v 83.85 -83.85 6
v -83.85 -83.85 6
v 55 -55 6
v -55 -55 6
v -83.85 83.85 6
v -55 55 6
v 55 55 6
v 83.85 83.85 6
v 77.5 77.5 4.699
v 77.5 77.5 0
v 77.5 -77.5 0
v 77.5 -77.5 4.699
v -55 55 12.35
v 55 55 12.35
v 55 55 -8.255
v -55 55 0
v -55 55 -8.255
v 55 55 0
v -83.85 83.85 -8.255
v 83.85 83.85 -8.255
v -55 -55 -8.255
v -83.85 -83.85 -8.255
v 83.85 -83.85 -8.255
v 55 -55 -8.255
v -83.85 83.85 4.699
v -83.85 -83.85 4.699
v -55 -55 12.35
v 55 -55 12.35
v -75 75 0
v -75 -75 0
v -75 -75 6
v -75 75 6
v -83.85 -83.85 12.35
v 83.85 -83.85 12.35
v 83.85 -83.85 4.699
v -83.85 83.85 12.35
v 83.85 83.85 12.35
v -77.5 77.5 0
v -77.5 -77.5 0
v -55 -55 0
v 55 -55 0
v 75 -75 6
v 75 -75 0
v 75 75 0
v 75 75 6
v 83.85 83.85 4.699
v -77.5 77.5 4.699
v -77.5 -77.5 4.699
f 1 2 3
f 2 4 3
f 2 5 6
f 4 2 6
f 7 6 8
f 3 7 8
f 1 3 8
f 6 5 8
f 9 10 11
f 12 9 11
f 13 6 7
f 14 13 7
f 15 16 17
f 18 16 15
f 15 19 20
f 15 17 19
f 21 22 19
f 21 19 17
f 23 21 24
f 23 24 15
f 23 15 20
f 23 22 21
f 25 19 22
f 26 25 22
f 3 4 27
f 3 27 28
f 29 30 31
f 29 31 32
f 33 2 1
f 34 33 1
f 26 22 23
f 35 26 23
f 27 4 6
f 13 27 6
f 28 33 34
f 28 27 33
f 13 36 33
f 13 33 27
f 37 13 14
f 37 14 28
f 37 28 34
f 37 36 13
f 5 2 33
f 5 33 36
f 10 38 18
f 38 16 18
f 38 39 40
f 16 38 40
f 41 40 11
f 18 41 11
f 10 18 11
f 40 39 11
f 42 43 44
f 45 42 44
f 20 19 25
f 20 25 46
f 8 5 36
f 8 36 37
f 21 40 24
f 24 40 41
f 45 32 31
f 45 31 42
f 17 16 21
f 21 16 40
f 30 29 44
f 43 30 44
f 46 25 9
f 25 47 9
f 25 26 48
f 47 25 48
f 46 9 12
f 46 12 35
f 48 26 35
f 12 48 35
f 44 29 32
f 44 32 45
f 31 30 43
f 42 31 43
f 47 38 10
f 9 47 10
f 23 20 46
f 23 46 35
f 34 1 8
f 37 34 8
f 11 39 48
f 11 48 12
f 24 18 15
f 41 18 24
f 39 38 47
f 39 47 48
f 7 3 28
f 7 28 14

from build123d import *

# Parameters (mm, degrees)
F0_W     = 150
F0_H     = 150
F1_DEPTH = 6
F2_W     = 155
F2_H     = 155
F2_W_2   = 110
F2_H_2   = 110
F3_DEPTH = 8.255
F4_W     = 167.7
F4_H     = 167.7
F4_W_2   = 155
F4_H_2   = 155
F5_DEPTH = 12.954
F6_W     = 167.7
F6_H     = 167.7
F6_W_2   = 110
F6_H_2   = 110
F7_DEPTH = 6.35


with BuildPart() as f1:
    # F0 (on Top) → F1 (new body)
    with BuildSketch(Plane.XY):
        Rectangle(F0_W, F0_H)
    extrude(amount=F1_DEPTH)


with BuildPart() as f3:
    # F2 (on face) → F3 (new body)
    with BuildSketch(Plane(origin=(0, 0, 0), x_dir=(1, 0, 0), z_dir=(0, 0, -1))):
        Rectangle(F2_W, F2_H)
        Rectangle(F2_W_2, F2_H_2, mode=Mode.SUBTRACT)
    extrude(amount=F3_DEPTH)

    # F4 (on face) → F5 (join)
    with BuildSketch(Plane(origin=(0, 0, -8.255), x_dir=(1, 0, 0), z_dir=(0, 0, -1))):
        Rectangle(F4_W, F4_H)
        Rectangle(F4_W_2, F4_H_2, mode=Mode.SUBTRACT)
    extrude(amount=-F5_DEPTH)


with BuildPart() as f7:
    # F6 (on face) → F7 (new body)
    with BuildSketch(Plane.XY.offset(6)):
        Rectangle(F6_W, F6_H)
        Rectangle(F6_W_2, F6_H_2, mode=Mode.SUBTRACT)
    extrude(amount=F7_DEPTH)


solid = Compound([f1.part, f3.part, f7.part])
